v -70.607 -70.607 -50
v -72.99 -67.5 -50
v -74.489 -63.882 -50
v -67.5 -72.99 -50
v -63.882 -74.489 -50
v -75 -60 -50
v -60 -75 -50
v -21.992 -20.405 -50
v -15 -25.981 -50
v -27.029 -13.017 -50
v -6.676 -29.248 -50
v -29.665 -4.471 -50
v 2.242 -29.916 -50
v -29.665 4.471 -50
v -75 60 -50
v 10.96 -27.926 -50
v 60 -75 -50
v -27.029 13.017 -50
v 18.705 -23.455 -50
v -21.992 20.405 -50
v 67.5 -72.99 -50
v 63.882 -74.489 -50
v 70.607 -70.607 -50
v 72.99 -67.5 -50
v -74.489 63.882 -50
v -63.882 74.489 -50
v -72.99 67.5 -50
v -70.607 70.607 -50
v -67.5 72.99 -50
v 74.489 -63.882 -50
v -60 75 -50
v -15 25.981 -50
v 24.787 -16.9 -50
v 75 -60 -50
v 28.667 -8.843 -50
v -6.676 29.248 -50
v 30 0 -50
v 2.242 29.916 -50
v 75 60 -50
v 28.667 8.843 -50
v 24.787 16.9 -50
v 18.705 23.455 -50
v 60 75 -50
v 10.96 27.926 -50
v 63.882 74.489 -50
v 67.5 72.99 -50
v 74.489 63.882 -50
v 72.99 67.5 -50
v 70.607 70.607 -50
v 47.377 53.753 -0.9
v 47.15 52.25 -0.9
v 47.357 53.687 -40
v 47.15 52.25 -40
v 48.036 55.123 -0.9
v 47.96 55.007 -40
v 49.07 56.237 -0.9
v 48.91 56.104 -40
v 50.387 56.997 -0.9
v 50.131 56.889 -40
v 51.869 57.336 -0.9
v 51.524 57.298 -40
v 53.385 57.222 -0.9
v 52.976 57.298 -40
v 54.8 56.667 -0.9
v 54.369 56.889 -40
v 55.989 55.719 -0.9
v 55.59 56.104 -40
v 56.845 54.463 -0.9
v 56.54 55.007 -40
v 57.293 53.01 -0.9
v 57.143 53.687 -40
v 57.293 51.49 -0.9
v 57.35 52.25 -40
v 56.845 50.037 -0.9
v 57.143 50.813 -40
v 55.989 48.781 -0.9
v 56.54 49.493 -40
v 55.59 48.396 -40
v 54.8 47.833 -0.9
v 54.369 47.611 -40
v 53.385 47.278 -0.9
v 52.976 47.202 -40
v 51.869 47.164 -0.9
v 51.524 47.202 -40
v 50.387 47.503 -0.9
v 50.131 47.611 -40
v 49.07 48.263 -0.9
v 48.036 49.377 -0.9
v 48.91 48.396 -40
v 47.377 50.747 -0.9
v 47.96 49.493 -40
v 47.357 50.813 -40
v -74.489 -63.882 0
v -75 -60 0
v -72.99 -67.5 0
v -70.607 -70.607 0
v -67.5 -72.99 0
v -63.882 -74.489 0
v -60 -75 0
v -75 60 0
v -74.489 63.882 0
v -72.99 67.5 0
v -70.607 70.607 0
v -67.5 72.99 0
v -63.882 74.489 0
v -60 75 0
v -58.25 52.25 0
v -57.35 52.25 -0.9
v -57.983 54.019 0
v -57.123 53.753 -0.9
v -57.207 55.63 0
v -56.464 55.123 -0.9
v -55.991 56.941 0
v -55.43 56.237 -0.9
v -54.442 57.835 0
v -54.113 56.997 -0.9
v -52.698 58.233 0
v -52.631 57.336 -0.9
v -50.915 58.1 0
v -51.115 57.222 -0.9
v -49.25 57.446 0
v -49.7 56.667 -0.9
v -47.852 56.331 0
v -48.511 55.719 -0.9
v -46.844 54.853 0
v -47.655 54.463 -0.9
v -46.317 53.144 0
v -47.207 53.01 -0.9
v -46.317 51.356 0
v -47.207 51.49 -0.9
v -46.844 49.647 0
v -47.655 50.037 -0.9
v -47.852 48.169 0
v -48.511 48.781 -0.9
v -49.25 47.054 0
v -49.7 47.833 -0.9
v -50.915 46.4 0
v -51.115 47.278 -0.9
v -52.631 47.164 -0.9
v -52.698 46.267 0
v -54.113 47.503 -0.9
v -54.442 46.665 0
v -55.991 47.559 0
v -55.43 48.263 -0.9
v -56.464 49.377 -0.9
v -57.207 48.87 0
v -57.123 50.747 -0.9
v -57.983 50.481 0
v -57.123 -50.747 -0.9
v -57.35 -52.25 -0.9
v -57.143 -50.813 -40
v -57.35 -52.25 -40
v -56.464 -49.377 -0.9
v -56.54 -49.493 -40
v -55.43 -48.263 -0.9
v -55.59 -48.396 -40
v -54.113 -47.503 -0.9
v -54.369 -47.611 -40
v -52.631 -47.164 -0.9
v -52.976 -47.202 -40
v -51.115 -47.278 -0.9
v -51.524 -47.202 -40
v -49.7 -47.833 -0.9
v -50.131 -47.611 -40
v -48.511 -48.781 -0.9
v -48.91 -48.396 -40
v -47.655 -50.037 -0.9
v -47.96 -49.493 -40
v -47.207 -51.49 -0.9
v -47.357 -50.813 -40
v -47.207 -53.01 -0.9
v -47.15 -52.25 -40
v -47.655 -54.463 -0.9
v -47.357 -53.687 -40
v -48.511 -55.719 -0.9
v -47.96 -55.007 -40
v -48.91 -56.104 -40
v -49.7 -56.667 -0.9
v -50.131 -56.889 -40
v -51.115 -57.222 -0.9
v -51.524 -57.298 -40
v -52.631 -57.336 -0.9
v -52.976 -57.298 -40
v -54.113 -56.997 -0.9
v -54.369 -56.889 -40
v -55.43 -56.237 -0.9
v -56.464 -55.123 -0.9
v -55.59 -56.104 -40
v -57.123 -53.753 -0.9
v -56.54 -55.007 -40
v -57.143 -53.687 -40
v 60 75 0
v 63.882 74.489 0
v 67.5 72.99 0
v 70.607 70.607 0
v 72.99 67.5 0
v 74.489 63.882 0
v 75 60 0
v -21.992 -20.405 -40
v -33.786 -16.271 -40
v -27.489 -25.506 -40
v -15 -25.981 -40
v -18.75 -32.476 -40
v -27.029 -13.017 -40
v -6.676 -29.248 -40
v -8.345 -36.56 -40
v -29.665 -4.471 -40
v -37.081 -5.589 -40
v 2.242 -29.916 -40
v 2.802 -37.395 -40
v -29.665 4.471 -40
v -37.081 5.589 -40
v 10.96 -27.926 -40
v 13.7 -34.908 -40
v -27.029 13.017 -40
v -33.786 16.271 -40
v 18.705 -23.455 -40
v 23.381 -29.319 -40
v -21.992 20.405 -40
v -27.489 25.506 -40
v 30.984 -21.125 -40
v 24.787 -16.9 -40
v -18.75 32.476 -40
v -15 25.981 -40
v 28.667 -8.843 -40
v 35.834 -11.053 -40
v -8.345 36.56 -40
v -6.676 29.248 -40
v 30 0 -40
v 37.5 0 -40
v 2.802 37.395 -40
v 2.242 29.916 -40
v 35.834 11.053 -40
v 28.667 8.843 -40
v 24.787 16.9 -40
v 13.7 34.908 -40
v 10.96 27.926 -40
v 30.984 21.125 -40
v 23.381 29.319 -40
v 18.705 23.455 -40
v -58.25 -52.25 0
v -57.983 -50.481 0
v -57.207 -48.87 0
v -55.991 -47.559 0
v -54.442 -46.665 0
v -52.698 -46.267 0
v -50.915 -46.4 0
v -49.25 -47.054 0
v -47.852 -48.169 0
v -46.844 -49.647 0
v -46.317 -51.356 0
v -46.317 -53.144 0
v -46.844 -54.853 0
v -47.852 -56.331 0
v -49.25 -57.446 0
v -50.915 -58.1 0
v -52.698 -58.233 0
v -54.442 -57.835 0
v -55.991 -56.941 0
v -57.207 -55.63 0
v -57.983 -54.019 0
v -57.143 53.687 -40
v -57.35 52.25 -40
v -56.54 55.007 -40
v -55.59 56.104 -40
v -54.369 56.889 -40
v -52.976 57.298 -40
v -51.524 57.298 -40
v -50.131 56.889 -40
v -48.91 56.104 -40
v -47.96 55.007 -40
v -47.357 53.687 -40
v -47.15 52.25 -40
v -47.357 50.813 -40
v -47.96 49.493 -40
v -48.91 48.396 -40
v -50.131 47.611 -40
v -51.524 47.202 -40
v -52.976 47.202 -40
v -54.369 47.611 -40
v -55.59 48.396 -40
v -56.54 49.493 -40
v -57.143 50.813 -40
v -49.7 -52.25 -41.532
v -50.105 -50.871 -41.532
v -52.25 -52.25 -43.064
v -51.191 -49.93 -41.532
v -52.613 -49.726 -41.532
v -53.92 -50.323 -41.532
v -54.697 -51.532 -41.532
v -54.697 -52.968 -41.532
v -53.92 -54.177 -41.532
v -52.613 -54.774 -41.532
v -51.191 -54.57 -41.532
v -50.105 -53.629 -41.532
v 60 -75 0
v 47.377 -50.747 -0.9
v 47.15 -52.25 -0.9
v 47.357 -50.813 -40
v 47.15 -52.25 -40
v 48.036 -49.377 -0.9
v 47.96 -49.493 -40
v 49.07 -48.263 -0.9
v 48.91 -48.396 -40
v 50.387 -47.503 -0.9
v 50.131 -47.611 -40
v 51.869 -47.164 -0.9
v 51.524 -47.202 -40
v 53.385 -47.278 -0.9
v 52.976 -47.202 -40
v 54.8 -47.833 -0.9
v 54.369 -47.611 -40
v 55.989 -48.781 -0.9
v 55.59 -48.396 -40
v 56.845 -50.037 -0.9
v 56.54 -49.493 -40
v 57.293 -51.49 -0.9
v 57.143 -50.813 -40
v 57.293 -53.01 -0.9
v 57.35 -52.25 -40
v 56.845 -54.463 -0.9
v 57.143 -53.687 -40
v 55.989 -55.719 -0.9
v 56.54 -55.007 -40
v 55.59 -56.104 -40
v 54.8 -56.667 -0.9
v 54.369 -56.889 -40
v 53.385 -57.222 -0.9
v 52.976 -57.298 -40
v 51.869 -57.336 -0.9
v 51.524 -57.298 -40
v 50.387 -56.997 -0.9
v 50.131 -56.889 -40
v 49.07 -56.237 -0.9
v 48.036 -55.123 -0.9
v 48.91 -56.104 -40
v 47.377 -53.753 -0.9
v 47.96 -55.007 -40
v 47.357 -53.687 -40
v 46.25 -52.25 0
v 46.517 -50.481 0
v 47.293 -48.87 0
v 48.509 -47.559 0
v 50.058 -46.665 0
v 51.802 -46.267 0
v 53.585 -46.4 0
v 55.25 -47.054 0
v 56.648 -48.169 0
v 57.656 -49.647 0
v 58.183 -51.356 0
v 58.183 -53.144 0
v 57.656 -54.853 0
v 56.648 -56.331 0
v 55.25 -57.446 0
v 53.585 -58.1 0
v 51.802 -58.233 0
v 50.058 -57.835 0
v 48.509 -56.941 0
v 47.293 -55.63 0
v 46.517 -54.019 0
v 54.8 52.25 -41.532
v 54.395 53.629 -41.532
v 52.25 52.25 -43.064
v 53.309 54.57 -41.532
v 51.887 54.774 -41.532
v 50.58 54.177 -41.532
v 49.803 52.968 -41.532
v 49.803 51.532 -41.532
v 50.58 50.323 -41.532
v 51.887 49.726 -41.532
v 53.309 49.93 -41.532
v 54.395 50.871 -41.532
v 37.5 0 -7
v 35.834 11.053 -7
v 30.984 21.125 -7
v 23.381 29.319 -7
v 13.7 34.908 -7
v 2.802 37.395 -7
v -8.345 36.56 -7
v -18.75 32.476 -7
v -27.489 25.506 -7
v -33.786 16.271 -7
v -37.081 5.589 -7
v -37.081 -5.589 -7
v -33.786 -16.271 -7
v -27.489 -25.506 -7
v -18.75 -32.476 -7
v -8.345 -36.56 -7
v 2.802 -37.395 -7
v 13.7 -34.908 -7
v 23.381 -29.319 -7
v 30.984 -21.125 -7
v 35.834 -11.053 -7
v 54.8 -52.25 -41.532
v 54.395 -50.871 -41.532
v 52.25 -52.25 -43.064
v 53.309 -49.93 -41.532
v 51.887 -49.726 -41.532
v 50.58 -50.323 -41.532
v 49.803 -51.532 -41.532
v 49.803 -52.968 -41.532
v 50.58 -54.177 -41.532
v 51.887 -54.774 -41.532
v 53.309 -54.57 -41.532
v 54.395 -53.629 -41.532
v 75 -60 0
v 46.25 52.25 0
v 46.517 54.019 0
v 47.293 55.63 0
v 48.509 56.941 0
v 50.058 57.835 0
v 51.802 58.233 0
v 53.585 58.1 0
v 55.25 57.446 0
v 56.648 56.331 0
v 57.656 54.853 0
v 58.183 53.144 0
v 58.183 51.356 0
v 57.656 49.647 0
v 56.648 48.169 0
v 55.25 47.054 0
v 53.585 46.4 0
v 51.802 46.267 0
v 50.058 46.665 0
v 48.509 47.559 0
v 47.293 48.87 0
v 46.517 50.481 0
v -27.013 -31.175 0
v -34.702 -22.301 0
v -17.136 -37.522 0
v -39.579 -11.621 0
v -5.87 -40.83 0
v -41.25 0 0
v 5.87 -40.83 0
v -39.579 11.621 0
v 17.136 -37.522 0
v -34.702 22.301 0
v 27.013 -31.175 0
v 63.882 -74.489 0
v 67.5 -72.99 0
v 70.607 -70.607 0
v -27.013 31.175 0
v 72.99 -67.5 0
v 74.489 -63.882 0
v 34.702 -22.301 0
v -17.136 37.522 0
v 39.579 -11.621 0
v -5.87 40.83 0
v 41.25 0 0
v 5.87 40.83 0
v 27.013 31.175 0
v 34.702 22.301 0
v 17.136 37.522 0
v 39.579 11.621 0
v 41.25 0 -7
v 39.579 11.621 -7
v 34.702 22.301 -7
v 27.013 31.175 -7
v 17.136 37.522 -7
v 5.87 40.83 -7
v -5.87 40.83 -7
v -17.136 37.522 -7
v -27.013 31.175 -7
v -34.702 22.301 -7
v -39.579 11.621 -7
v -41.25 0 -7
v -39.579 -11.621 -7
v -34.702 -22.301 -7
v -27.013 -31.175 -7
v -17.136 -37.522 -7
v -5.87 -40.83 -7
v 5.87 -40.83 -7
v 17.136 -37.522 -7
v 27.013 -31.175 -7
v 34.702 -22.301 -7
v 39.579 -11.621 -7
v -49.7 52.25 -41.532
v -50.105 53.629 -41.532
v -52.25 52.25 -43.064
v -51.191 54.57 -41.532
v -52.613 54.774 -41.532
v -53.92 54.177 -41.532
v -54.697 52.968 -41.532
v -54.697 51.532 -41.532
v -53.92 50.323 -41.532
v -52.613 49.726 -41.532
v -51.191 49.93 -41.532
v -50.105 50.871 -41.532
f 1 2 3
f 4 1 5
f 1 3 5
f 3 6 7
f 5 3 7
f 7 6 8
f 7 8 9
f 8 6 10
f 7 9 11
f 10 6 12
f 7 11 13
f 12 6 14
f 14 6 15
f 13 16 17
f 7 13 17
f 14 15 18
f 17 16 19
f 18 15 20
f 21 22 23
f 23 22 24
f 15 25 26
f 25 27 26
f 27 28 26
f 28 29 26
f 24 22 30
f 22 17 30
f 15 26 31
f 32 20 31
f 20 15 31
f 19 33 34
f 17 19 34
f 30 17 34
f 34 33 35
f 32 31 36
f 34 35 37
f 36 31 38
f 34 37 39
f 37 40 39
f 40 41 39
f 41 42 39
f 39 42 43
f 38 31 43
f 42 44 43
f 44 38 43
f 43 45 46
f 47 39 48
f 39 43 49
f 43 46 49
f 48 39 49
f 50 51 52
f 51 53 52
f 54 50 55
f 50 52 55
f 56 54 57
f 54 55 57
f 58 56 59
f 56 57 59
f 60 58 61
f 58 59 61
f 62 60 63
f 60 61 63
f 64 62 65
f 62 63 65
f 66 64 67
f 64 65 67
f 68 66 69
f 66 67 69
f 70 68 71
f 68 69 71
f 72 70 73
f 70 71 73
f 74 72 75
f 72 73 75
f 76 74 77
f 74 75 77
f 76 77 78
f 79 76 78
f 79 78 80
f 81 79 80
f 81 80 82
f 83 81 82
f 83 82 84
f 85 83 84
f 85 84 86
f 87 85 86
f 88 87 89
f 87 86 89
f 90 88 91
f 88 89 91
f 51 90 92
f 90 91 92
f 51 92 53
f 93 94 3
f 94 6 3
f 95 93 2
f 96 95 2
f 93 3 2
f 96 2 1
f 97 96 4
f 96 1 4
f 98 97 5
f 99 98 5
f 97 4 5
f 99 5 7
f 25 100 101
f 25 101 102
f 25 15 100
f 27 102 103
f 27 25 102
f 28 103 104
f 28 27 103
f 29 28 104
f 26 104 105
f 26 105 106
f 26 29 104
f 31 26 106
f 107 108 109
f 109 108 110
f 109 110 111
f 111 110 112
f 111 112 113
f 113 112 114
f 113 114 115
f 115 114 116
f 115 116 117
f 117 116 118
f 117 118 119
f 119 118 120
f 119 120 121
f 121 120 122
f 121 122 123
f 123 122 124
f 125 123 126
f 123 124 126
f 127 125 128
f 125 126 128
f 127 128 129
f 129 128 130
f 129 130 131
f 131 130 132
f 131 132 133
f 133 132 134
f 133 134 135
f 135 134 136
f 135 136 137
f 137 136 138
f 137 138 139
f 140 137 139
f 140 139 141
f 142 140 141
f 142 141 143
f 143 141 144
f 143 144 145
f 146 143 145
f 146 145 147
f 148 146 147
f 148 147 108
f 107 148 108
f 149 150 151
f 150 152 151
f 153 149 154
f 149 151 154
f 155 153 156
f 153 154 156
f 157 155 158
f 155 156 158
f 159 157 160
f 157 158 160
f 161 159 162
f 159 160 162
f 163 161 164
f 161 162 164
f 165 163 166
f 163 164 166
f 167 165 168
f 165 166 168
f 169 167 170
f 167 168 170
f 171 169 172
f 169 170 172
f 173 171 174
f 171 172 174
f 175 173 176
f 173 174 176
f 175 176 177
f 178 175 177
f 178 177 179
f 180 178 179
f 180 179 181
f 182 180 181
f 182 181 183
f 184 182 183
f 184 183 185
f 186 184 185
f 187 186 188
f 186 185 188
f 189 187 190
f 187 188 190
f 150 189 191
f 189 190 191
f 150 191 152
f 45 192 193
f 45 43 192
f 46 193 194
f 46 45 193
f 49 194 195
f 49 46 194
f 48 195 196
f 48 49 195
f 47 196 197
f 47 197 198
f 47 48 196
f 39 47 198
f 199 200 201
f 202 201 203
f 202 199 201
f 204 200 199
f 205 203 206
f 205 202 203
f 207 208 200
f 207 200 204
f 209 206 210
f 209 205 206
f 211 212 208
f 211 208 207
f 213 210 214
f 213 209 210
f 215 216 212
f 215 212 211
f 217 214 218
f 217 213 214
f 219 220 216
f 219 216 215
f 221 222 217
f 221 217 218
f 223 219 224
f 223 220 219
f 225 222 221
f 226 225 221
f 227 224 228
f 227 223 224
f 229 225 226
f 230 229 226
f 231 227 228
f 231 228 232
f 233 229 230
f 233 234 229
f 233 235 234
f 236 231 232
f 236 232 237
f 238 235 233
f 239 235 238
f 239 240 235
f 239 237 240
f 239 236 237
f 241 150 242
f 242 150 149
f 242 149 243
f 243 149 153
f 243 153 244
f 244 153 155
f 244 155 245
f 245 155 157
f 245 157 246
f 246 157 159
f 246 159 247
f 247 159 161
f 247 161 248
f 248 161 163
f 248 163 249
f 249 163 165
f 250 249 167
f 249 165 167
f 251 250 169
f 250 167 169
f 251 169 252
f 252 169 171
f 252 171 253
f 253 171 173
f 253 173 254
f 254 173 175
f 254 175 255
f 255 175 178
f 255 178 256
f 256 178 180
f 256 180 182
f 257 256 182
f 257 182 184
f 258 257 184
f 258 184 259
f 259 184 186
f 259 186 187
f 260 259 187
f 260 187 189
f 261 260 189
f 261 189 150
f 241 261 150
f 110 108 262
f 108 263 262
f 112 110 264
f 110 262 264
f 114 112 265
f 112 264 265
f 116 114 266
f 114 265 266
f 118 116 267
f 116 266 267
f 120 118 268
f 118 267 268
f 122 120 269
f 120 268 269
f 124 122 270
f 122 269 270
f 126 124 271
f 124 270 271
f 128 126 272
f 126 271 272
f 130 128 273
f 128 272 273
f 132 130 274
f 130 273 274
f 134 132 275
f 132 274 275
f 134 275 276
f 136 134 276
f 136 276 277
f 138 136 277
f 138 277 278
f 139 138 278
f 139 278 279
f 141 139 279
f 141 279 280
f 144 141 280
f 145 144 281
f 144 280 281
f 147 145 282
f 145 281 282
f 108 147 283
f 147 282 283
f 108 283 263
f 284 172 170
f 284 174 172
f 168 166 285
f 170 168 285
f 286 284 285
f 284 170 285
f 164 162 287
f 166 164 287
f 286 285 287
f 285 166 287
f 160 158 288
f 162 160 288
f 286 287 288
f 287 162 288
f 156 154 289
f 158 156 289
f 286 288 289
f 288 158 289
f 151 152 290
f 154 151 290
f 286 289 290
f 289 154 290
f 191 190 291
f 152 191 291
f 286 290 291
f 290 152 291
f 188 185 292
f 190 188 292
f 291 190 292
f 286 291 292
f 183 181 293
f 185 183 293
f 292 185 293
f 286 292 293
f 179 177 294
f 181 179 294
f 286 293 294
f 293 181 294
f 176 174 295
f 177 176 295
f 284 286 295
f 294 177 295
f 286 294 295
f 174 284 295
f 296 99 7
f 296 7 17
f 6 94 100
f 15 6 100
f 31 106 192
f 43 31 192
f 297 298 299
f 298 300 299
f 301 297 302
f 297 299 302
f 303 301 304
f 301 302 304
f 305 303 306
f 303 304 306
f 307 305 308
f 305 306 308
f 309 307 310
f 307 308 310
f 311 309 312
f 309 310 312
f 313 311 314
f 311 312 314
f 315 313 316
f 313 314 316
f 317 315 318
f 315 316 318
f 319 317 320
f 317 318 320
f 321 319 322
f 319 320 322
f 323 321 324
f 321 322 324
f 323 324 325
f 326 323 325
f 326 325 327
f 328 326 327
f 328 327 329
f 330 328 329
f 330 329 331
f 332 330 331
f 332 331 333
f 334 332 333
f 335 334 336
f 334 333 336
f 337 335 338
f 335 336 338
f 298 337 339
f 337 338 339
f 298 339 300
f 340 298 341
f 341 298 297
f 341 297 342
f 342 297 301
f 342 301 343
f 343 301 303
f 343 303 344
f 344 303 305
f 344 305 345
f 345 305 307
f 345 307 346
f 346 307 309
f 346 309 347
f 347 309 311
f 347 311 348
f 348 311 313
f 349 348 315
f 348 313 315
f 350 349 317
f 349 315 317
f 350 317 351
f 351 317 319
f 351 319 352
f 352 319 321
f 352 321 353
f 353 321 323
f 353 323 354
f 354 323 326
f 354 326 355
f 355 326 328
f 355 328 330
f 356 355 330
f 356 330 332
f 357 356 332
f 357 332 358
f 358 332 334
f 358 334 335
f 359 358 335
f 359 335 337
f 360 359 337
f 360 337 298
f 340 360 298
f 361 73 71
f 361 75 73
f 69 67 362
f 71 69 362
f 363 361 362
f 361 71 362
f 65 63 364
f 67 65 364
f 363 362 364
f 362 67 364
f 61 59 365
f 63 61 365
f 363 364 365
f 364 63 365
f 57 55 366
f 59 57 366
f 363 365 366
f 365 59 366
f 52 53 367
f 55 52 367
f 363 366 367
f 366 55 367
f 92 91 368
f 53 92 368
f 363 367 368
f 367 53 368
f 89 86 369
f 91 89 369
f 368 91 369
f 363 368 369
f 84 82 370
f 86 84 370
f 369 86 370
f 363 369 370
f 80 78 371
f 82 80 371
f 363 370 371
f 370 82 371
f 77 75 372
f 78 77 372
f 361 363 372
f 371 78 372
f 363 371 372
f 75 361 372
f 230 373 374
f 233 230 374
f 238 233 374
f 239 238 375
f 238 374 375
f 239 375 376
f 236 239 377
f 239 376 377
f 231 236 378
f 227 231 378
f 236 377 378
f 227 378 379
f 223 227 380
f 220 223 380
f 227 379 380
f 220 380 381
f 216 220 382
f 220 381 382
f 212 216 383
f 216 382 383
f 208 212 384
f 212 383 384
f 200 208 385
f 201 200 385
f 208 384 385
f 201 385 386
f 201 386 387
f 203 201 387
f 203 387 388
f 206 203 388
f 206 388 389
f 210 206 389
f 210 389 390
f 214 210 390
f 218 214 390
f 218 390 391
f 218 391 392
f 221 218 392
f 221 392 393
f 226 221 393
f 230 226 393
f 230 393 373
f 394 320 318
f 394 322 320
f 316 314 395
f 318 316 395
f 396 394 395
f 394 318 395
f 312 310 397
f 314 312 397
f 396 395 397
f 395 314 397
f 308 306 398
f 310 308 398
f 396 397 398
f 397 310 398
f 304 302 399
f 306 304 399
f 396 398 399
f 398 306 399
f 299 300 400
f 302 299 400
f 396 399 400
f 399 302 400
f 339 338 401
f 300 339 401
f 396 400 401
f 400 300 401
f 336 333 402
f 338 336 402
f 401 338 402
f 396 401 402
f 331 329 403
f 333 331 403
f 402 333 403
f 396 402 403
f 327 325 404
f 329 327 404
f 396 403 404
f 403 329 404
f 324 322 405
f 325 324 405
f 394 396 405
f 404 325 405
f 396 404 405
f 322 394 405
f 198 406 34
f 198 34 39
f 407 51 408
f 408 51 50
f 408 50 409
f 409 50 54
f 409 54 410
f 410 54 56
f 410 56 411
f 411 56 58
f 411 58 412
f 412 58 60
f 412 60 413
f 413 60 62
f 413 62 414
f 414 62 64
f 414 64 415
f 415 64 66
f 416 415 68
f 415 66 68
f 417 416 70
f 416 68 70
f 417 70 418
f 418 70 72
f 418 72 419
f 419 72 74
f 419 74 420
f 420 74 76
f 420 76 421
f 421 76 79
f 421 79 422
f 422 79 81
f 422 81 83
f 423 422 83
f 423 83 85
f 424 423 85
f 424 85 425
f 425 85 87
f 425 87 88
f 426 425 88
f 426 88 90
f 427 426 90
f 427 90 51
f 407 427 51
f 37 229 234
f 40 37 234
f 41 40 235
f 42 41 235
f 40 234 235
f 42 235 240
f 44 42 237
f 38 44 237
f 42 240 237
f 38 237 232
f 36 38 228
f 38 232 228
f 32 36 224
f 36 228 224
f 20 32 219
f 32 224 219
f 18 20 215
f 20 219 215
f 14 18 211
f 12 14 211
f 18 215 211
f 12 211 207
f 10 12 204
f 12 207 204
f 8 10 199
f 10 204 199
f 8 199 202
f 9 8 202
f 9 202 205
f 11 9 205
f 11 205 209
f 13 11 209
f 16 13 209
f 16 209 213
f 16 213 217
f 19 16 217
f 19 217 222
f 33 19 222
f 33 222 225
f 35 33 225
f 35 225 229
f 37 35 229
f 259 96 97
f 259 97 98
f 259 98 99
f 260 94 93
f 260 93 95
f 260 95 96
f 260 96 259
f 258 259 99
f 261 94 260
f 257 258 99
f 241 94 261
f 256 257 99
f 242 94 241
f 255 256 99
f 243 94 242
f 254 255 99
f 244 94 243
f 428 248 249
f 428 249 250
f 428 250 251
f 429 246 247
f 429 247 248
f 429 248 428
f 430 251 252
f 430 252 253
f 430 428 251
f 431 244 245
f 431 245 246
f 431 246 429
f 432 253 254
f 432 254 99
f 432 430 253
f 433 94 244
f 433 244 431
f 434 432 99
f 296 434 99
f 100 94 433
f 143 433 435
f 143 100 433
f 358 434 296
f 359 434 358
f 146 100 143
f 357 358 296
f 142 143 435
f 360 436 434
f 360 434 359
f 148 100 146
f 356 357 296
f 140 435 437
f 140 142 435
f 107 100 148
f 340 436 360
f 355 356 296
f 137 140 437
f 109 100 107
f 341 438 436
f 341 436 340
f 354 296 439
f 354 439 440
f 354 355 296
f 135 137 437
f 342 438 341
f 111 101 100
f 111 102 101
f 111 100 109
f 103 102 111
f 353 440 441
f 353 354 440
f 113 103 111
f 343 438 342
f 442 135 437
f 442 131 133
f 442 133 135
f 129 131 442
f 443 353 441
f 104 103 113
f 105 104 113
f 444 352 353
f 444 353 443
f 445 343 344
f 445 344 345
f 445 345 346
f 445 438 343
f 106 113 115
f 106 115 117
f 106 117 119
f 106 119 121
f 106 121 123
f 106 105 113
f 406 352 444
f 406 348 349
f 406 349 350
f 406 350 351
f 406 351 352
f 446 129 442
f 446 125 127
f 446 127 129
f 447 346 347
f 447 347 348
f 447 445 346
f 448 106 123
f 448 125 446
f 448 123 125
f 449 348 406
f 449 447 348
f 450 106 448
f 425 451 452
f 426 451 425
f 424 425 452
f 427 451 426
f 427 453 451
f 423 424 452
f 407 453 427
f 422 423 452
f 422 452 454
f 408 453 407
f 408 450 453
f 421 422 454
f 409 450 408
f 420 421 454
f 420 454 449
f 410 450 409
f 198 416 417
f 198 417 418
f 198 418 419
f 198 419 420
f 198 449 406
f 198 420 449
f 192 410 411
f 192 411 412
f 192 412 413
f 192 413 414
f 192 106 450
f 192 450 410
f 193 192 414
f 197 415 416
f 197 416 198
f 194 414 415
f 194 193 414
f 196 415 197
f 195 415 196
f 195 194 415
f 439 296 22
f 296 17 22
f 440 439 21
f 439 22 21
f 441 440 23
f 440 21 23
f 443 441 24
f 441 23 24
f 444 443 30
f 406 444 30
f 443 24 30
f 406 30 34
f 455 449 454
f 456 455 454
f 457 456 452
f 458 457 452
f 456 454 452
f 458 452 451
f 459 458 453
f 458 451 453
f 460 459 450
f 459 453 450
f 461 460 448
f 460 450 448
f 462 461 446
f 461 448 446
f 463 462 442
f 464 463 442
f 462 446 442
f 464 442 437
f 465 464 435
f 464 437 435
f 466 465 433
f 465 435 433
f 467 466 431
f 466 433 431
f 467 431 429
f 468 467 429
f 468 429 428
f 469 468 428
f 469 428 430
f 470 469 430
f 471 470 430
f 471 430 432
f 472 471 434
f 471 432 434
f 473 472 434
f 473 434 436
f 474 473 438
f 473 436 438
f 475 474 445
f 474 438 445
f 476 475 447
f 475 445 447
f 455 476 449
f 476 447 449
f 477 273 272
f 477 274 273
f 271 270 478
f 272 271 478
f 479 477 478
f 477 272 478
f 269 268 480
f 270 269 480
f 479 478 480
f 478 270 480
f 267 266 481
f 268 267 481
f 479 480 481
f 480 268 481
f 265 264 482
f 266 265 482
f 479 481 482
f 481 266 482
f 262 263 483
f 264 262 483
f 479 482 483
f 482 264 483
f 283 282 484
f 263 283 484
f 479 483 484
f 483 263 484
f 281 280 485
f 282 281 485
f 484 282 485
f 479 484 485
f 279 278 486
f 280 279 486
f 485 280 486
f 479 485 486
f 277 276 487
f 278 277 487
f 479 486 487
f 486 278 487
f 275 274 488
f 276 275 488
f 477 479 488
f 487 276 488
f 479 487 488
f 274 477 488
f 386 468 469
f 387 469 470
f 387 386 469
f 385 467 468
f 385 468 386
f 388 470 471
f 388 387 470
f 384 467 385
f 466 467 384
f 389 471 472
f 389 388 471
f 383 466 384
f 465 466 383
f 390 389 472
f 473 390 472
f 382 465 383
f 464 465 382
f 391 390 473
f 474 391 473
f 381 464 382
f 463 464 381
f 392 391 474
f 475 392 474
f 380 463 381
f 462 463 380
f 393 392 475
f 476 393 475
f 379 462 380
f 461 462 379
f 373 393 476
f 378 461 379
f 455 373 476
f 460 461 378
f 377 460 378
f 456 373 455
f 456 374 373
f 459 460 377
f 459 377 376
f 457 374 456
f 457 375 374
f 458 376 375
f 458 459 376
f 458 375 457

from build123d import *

# Parameters (mm, degrees)
F0_W           = 150
F0_H           = 150
F0_R           = 30
F1_DEPTH       = 50
F2_R           = 37.5
F2_R_2         = 30
F3_DEPTH       = 40
F4_R           = 41.25
F4_R_2         = 37.5
F5_DEPTH       = 7
F7_D           = 10.2
F7_DEPTH       = 40
F7_CSINK_D     = 12
F7_CSINK_ANGLE = 90
F7_TIP         = 3.064389157
F8_R           = 15


with BuildPart() as f1:
    # F0 (on Top) → F1 (new body)
    with BuildSketch(Plane.XY):
        Rectangle(F0_W, F0_H)
        Circle(F0_R, mode=Mode.SUBTRACT)
    extrude(amount=-F1_DEPTH)

    # F2 (on face) → F3 (cut)
    with BuildSketch(Plane.XY):
        Circle(F2_R)
        Circle(F2_R_2, mode=Mode.SUBTRACT)
    extrude(amount=-F3_DEPTH, mode=Mode.SUBTRACT)

    # F4 (on face) → F5 (cut)
    with BuildSketch(Plane.XY):
        Circle(F4_R)
        Circle(F4_R_2, mode=Mode.SUBTRACT)
    extrude(amount=-F5_DEPTH, mode=Mode.SUBTRACT)

    # F7
    with Locations(Plane.XY):
        with Locations((-52.25, 52.25), (52.25, 52.25), (52.25, -52.25), (-52.25, -52.25)):
            CounterSinkHole(F7_D / 2, F7_CSINK_D / 2, depth=F7_DEPTH, counter_sink_angle=F7_CSINK_ANGLE)
            with Locations((0, 0, -(F7_DEPTH + F7_TIP / 2))):  # 118° drill point
                Cone(0, F7_D / 2, F7_TIP, mode=Mode.SUBTRACT)

    # F8
    f8_edges = [f1.edges().sort_by_distance(p)[0] for p in [
        (-75, 75, -25),
        (75, 75, -25),
        (75, -75, -25),
        (-75, -75, -25),
    ]]
    fillet(f8_edges, radius=F8_R)


solid = f1.part
